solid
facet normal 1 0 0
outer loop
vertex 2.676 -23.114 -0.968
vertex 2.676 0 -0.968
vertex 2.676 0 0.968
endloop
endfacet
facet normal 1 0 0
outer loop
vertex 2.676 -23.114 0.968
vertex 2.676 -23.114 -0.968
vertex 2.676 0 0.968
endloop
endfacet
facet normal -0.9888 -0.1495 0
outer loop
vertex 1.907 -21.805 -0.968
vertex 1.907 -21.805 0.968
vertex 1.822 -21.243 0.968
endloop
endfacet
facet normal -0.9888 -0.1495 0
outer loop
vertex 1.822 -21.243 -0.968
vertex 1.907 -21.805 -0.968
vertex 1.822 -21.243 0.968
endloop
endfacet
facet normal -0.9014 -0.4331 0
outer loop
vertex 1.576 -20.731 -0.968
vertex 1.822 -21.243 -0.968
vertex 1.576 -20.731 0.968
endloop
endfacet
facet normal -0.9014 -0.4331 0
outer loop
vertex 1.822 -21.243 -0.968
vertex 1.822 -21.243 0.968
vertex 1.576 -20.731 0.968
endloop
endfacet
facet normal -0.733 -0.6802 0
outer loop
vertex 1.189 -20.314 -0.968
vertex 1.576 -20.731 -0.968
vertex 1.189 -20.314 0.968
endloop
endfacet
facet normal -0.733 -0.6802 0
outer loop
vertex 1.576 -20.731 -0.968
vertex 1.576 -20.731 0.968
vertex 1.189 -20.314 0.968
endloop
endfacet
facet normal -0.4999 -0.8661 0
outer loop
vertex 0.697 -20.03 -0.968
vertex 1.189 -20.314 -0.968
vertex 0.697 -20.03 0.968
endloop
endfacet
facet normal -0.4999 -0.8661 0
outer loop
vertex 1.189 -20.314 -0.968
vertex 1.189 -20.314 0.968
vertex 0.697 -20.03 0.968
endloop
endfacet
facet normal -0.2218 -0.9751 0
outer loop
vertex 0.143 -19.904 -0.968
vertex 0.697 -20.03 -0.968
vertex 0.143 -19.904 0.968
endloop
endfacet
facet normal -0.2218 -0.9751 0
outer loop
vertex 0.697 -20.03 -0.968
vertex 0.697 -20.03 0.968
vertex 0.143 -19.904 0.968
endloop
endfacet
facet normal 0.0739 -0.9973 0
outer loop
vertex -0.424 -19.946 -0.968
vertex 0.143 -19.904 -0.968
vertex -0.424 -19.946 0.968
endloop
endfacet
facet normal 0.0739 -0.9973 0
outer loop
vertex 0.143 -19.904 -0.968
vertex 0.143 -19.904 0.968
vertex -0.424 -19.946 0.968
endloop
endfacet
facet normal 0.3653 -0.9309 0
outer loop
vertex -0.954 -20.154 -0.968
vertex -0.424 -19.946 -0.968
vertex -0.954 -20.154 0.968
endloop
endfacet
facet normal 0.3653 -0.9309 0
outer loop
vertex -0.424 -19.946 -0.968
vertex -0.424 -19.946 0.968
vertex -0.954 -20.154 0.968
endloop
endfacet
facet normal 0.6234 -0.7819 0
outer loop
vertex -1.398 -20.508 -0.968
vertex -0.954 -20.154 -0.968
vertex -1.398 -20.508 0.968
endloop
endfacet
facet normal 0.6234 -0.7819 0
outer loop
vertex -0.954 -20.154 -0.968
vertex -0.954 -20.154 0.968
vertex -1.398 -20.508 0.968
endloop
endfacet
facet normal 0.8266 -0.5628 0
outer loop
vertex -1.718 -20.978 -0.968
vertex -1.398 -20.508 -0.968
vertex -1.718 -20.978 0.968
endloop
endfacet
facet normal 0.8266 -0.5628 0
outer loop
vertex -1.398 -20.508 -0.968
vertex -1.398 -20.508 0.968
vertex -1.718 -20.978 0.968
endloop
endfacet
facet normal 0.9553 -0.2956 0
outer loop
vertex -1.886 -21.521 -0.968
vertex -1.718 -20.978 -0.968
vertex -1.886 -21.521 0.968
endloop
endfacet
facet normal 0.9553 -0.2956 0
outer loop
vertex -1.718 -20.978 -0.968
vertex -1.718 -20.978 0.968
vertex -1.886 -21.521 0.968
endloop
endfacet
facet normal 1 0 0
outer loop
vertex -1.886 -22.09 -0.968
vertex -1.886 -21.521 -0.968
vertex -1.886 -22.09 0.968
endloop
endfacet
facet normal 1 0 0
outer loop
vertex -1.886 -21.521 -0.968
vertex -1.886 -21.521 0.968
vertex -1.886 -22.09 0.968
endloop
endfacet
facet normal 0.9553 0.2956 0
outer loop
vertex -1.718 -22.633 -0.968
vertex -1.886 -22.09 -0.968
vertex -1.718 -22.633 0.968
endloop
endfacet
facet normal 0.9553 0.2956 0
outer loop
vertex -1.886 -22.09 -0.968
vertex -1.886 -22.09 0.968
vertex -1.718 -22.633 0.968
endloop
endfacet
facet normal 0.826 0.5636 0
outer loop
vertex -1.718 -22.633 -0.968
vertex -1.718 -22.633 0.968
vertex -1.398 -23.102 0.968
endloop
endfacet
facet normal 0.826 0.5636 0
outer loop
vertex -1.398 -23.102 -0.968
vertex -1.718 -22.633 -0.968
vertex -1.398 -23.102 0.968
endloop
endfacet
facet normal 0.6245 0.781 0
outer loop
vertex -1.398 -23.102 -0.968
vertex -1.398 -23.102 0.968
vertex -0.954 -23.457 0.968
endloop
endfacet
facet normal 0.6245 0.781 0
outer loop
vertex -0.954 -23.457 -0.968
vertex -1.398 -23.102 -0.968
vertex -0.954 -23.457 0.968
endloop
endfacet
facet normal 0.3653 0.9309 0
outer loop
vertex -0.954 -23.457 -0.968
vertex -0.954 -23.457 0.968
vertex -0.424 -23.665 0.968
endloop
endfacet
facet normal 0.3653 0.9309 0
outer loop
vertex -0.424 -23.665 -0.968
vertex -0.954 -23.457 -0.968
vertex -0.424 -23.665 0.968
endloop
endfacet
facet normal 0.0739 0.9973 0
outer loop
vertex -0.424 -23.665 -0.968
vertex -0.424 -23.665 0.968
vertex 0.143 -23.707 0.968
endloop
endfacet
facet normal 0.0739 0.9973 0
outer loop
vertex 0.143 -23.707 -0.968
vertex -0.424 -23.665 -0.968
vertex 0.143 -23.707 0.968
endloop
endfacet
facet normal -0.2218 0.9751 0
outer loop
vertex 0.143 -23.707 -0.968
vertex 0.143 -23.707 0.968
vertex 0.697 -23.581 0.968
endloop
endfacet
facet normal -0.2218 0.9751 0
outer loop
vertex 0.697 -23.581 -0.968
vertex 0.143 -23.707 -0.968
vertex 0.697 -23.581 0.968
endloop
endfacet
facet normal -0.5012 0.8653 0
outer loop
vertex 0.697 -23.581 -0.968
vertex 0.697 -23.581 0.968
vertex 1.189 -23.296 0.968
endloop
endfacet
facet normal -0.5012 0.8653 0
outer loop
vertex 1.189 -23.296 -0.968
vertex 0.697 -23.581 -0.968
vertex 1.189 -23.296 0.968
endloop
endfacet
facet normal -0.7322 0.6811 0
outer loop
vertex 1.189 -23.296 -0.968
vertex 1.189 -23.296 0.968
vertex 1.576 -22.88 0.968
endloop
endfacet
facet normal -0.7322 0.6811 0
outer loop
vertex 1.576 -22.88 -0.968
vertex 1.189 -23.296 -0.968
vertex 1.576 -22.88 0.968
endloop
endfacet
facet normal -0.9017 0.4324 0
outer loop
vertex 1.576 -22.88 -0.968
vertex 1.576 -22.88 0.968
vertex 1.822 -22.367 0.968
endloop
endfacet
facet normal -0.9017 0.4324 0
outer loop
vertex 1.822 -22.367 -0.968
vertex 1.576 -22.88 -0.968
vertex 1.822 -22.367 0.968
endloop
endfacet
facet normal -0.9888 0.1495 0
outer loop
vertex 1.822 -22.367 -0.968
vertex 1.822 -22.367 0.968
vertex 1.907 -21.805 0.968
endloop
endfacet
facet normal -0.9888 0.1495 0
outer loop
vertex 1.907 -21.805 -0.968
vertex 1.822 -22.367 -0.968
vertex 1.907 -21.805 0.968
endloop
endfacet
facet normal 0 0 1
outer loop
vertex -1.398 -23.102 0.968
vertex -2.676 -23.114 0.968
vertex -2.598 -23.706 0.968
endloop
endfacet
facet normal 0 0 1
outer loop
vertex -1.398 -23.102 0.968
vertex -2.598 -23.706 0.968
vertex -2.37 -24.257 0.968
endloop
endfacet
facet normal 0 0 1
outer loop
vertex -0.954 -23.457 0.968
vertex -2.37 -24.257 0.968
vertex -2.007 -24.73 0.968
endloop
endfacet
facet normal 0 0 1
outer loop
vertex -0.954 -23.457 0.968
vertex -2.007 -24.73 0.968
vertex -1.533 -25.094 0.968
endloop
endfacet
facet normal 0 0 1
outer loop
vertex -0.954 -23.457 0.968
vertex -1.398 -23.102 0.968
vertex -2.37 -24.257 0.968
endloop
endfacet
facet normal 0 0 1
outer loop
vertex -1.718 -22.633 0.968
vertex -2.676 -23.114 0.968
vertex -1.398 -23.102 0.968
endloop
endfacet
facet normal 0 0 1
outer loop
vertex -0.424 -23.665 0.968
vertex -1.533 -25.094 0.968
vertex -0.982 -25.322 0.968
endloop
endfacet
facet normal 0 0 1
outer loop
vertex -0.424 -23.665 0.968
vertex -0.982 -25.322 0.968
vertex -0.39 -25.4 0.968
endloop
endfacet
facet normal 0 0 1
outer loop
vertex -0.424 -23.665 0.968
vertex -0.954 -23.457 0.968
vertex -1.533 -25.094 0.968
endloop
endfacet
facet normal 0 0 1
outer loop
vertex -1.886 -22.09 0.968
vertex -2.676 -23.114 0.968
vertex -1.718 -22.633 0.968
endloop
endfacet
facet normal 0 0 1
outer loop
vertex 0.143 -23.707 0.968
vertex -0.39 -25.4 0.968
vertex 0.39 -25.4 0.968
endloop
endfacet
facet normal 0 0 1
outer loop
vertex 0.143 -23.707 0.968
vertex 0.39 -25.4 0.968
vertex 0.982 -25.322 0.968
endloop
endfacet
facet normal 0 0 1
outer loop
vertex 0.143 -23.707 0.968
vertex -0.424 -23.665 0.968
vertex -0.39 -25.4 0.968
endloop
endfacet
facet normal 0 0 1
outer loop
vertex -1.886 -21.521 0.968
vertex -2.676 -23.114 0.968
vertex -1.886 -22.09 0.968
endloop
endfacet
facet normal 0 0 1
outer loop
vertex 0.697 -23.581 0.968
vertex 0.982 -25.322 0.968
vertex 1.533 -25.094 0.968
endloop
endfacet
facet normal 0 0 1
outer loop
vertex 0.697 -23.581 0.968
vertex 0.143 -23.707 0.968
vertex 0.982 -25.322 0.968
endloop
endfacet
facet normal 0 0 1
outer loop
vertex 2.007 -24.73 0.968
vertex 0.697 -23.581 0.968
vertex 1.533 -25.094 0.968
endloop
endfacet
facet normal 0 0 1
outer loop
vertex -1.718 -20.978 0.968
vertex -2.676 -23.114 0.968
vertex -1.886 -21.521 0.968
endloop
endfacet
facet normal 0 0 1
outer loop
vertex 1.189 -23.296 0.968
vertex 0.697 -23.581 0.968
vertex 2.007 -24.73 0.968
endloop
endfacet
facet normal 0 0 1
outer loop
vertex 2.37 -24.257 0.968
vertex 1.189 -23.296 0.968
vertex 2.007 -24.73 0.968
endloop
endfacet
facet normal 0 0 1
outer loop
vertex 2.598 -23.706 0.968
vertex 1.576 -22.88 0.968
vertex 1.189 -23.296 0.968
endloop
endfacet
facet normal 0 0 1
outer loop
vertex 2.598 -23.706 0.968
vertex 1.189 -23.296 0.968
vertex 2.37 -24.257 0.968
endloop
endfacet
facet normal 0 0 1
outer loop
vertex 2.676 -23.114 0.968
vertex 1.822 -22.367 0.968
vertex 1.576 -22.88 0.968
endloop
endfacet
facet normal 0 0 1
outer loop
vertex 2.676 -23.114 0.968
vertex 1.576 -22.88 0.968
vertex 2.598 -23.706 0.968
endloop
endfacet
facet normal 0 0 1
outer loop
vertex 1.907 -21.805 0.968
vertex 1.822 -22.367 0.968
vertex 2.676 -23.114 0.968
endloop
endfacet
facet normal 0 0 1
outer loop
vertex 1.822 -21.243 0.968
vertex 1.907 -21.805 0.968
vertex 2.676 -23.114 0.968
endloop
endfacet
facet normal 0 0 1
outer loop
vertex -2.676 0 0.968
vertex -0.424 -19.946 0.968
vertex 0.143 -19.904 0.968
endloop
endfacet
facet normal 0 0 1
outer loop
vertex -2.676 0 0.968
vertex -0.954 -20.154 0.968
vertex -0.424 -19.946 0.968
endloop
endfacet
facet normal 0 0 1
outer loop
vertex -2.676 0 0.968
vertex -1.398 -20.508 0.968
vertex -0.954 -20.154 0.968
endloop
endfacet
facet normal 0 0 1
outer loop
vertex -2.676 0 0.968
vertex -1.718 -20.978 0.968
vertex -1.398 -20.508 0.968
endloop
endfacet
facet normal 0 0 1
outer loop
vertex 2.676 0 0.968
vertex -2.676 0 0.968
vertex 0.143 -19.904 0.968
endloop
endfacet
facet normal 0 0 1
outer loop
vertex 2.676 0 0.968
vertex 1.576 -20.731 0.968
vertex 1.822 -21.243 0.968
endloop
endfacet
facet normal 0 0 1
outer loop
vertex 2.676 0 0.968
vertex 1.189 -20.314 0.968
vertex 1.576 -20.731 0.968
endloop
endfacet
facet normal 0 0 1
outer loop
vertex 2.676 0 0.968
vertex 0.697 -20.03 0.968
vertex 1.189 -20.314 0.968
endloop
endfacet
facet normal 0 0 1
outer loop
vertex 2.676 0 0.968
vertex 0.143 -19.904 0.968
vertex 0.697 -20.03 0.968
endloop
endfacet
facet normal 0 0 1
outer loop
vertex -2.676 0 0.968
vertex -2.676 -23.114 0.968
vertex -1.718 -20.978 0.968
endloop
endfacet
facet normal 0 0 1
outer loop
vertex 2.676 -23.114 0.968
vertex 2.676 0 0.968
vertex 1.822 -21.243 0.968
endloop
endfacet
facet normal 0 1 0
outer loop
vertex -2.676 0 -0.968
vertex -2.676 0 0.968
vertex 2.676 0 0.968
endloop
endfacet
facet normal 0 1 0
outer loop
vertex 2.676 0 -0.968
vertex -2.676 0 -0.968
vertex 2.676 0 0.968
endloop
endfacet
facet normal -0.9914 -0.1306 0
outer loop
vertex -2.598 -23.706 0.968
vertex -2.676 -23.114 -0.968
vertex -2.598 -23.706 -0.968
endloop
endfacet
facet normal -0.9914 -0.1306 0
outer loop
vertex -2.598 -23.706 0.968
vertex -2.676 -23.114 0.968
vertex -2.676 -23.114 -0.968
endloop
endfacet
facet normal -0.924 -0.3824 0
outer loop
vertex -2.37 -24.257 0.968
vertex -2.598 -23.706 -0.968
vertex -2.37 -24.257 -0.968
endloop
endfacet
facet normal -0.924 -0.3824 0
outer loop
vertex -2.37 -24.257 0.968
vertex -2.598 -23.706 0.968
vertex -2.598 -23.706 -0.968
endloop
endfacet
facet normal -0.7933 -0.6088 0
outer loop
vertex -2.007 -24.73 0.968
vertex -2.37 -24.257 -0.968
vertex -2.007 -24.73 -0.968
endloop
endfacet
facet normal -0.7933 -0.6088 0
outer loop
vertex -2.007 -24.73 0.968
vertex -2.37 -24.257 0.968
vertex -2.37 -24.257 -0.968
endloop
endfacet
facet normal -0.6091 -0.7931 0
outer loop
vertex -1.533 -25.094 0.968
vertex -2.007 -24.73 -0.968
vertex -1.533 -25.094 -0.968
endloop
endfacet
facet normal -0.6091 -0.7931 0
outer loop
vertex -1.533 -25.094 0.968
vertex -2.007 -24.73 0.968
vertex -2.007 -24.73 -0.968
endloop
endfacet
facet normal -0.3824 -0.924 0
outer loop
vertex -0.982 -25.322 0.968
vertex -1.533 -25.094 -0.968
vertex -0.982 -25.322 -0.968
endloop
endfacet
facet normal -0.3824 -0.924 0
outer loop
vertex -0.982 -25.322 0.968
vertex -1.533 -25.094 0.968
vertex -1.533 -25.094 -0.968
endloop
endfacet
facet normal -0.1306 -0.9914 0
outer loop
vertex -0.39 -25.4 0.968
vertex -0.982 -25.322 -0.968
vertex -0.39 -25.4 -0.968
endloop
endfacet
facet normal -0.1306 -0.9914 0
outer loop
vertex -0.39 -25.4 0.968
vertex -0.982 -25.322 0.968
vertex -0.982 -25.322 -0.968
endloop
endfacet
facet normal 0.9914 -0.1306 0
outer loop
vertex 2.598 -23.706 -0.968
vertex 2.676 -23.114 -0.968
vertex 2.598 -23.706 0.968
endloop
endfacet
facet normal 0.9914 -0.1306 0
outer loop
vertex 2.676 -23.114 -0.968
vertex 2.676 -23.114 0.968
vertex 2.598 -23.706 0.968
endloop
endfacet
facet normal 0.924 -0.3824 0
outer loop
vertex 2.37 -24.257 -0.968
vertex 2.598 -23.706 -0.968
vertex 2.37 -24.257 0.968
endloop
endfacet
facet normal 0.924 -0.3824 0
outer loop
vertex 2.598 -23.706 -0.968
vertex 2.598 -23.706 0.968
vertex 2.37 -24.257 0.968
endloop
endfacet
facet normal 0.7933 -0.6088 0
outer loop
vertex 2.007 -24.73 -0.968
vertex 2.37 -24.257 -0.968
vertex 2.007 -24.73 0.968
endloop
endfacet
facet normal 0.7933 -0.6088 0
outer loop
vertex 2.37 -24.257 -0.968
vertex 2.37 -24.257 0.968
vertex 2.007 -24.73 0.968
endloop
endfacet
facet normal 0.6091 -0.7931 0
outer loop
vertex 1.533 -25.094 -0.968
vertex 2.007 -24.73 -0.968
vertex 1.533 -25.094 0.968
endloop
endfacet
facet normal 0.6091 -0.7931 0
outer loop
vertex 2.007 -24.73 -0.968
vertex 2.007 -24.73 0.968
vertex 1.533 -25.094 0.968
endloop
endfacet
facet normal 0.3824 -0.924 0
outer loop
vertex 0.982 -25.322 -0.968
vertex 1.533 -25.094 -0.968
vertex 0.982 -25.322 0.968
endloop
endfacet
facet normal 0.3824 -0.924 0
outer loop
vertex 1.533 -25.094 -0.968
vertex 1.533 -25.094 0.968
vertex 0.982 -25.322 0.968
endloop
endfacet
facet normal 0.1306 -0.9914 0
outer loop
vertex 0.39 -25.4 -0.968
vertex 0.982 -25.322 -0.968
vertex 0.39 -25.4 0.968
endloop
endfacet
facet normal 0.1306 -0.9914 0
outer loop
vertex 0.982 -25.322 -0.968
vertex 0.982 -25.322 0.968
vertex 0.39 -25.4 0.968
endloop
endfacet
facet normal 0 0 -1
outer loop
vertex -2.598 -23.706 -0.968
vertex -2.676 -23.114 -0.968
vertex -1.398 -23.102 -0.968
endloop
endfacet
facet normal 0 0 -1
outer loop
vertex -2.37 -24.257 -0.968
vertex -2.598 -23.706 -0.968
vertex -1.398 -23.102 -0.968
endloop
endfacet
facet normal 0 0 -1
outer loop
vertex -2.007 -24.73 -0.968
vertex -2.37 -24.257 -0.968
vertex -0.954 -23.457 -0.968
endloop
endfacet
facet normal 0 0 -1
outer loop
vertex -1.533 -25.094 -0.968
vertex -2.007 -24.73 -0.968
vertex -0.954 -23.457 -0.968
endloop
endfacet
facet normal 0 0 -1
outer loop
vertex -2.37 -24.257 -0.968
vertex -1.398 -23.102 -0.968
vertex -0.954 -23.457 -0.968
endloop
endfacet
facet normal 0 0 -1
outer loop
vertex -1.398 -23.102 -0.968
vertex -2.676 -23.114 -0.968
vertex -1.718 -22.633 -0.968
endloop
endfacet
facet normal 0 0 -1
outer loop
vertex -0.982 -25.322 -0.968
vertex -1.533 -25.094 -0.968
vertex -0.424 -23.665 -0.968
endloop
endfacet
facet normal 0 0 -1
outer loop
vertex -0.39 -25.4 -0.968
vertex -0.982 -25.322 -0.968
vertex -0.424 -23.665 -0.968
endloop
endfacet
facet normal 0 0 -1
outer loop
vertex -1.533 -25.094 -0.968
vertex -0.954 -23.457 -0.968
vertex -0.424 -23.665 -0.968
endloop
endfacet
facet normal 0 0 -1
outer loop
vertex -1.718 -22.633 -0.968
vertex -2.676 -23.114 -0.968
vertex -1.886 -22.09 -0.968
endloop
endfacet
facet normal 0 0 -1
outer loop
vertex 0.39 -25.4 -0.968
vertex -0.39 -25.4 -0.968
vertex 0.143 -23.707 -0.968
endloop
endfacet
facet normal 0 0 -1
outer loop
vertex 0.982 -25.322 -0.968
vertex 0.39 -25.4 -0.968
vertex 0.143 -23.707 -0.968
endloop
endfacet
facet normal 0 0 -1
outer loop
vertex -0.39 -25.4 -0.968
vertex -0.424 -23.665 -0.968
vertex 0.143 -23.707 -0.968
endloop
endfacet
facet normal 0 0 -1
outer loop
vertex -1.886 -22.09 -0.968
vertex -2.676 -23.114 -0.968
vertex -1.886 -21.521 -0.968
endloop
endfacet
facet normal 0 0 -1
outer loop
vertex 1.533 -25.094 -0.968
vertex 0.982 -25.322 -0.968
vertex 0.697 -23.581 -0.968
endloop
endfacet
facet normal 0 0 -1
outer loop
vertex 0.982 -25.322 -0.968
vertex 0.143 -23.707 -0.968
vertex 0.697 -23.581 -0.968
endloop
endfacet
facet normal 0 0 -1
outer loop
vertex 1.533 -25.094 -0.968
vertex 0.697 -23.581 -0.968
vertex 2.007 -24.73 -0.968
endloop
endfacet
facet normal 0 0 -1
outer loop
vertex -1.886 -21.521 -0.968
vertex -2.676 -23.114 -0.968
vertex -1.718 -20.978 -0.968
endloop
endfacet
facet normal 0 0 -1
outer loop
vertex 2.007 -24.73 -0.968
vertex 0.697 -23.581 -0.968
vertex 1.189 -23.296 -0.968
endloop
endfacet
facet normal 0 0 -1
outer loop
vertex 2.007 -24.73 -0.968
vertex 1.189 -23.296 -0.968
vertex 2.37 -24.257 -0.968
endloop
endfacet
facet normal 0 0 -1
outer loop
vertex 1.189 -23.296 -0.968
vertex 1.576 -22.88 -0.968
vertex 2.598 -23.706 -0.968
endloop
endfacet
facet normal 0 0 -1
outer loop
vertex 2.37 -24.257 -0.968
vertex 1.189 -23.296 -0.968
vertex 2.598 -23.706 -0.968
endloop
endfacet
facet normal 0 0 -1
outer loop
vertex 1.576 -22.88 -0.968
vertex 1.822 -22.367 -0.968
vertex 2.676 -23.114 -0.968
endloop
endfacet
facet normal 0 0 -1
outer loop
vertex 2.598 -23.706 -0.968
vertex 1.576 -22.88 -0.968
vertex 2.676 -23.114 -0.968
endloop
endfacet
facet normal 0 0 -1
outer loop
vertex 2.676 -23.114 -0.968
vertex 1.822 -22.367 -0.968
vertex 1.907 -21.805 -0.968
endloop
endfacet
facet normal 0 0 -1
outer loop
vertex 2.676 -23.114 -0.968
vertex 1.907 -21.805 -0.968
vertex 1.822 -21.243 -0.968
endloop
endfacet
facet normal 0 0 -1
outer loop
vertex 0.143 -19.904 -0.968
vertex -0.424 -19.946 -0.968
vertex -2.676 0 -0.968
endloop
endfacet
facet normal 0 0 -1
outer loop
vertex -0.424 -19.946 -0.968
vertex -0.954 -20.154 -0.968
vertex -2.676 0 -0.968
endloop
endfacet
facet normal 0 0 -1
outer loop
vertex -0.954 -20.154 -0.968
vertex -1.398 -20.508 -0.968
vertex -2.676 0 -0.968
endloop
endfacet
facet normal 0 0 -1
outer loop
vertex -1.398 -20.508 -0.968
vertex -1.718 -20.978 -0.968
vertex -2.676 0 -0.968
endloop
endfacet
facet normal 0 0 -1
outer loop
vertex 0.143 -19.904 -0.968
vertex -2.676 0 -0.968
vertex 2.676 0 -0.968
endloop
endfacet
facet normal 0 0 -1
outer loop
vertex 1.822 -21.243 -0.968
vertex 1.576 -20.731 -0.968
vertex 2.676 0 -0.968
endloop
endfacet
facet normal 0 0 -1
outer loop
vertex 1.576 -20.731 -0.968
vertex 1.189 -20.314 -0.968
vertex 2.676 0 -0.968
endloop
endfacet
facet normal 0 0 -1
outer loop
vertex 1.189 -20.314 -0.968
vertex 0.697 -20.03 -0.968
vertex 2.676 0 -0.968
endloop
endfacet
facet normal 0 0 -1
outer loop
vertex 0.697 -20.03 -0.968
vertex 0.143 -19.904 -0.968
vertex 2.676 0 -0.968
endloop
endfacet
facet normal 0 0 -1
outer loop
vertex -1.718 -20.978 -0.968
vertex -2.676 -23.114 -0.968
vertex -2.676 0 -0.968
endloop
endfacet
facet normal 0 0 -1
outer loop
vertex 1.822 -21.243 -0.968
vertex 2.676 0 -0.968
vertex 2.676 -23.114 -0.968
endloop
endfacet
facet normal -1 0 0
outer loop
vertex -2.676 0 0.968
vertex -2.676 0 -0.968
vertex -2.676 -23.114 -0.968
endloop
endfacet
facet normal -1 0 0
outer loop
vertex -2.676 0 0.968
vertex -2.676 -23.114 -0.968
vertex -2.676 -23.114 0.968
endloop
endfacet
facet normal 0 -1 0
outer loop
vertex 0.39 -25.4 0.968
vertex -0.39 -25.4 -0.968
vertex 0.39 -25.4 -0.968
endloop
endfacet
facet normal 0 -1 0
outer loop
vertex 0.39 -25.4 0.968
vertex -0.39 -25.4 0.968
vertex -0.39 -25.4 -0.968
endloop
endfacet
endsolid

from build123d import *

# Parameters (mm, degrees)
F0_W     = 5.352506
F0_H     = 1.93545
F1_DEPTH = 25.4
F2_R     = 2.286
F3_R     = 1.907129
F4_DEPTH = 2.39776


with BuildPart() as f1:
    # F0 (on Front) → F1 (new body)
    with BuildSketch(Plane.XZ):
        Rectangle(F0_W, F0_H)
    extrude(amount=F1_DEPTH)

    # F2
    f2_edges = [f1.edges().sort_by_distance(p)[0] for p in [
        (-2.676253, -25.4, 0),
        (2.676253, -25.4, 0),
    ]]
    fillet(f2_edges, radius=F2_R)

    # F3 (on face) → F4 (cut)
    with BuildSketch(Plane.XY.offset(0.967725)):
        with Locations((0, -21.805298)):
            Circle(F3_R)
    extrude(amount=-F4_DEPTH, mode=Mode.SUBTRACT)


solid = f1.part
